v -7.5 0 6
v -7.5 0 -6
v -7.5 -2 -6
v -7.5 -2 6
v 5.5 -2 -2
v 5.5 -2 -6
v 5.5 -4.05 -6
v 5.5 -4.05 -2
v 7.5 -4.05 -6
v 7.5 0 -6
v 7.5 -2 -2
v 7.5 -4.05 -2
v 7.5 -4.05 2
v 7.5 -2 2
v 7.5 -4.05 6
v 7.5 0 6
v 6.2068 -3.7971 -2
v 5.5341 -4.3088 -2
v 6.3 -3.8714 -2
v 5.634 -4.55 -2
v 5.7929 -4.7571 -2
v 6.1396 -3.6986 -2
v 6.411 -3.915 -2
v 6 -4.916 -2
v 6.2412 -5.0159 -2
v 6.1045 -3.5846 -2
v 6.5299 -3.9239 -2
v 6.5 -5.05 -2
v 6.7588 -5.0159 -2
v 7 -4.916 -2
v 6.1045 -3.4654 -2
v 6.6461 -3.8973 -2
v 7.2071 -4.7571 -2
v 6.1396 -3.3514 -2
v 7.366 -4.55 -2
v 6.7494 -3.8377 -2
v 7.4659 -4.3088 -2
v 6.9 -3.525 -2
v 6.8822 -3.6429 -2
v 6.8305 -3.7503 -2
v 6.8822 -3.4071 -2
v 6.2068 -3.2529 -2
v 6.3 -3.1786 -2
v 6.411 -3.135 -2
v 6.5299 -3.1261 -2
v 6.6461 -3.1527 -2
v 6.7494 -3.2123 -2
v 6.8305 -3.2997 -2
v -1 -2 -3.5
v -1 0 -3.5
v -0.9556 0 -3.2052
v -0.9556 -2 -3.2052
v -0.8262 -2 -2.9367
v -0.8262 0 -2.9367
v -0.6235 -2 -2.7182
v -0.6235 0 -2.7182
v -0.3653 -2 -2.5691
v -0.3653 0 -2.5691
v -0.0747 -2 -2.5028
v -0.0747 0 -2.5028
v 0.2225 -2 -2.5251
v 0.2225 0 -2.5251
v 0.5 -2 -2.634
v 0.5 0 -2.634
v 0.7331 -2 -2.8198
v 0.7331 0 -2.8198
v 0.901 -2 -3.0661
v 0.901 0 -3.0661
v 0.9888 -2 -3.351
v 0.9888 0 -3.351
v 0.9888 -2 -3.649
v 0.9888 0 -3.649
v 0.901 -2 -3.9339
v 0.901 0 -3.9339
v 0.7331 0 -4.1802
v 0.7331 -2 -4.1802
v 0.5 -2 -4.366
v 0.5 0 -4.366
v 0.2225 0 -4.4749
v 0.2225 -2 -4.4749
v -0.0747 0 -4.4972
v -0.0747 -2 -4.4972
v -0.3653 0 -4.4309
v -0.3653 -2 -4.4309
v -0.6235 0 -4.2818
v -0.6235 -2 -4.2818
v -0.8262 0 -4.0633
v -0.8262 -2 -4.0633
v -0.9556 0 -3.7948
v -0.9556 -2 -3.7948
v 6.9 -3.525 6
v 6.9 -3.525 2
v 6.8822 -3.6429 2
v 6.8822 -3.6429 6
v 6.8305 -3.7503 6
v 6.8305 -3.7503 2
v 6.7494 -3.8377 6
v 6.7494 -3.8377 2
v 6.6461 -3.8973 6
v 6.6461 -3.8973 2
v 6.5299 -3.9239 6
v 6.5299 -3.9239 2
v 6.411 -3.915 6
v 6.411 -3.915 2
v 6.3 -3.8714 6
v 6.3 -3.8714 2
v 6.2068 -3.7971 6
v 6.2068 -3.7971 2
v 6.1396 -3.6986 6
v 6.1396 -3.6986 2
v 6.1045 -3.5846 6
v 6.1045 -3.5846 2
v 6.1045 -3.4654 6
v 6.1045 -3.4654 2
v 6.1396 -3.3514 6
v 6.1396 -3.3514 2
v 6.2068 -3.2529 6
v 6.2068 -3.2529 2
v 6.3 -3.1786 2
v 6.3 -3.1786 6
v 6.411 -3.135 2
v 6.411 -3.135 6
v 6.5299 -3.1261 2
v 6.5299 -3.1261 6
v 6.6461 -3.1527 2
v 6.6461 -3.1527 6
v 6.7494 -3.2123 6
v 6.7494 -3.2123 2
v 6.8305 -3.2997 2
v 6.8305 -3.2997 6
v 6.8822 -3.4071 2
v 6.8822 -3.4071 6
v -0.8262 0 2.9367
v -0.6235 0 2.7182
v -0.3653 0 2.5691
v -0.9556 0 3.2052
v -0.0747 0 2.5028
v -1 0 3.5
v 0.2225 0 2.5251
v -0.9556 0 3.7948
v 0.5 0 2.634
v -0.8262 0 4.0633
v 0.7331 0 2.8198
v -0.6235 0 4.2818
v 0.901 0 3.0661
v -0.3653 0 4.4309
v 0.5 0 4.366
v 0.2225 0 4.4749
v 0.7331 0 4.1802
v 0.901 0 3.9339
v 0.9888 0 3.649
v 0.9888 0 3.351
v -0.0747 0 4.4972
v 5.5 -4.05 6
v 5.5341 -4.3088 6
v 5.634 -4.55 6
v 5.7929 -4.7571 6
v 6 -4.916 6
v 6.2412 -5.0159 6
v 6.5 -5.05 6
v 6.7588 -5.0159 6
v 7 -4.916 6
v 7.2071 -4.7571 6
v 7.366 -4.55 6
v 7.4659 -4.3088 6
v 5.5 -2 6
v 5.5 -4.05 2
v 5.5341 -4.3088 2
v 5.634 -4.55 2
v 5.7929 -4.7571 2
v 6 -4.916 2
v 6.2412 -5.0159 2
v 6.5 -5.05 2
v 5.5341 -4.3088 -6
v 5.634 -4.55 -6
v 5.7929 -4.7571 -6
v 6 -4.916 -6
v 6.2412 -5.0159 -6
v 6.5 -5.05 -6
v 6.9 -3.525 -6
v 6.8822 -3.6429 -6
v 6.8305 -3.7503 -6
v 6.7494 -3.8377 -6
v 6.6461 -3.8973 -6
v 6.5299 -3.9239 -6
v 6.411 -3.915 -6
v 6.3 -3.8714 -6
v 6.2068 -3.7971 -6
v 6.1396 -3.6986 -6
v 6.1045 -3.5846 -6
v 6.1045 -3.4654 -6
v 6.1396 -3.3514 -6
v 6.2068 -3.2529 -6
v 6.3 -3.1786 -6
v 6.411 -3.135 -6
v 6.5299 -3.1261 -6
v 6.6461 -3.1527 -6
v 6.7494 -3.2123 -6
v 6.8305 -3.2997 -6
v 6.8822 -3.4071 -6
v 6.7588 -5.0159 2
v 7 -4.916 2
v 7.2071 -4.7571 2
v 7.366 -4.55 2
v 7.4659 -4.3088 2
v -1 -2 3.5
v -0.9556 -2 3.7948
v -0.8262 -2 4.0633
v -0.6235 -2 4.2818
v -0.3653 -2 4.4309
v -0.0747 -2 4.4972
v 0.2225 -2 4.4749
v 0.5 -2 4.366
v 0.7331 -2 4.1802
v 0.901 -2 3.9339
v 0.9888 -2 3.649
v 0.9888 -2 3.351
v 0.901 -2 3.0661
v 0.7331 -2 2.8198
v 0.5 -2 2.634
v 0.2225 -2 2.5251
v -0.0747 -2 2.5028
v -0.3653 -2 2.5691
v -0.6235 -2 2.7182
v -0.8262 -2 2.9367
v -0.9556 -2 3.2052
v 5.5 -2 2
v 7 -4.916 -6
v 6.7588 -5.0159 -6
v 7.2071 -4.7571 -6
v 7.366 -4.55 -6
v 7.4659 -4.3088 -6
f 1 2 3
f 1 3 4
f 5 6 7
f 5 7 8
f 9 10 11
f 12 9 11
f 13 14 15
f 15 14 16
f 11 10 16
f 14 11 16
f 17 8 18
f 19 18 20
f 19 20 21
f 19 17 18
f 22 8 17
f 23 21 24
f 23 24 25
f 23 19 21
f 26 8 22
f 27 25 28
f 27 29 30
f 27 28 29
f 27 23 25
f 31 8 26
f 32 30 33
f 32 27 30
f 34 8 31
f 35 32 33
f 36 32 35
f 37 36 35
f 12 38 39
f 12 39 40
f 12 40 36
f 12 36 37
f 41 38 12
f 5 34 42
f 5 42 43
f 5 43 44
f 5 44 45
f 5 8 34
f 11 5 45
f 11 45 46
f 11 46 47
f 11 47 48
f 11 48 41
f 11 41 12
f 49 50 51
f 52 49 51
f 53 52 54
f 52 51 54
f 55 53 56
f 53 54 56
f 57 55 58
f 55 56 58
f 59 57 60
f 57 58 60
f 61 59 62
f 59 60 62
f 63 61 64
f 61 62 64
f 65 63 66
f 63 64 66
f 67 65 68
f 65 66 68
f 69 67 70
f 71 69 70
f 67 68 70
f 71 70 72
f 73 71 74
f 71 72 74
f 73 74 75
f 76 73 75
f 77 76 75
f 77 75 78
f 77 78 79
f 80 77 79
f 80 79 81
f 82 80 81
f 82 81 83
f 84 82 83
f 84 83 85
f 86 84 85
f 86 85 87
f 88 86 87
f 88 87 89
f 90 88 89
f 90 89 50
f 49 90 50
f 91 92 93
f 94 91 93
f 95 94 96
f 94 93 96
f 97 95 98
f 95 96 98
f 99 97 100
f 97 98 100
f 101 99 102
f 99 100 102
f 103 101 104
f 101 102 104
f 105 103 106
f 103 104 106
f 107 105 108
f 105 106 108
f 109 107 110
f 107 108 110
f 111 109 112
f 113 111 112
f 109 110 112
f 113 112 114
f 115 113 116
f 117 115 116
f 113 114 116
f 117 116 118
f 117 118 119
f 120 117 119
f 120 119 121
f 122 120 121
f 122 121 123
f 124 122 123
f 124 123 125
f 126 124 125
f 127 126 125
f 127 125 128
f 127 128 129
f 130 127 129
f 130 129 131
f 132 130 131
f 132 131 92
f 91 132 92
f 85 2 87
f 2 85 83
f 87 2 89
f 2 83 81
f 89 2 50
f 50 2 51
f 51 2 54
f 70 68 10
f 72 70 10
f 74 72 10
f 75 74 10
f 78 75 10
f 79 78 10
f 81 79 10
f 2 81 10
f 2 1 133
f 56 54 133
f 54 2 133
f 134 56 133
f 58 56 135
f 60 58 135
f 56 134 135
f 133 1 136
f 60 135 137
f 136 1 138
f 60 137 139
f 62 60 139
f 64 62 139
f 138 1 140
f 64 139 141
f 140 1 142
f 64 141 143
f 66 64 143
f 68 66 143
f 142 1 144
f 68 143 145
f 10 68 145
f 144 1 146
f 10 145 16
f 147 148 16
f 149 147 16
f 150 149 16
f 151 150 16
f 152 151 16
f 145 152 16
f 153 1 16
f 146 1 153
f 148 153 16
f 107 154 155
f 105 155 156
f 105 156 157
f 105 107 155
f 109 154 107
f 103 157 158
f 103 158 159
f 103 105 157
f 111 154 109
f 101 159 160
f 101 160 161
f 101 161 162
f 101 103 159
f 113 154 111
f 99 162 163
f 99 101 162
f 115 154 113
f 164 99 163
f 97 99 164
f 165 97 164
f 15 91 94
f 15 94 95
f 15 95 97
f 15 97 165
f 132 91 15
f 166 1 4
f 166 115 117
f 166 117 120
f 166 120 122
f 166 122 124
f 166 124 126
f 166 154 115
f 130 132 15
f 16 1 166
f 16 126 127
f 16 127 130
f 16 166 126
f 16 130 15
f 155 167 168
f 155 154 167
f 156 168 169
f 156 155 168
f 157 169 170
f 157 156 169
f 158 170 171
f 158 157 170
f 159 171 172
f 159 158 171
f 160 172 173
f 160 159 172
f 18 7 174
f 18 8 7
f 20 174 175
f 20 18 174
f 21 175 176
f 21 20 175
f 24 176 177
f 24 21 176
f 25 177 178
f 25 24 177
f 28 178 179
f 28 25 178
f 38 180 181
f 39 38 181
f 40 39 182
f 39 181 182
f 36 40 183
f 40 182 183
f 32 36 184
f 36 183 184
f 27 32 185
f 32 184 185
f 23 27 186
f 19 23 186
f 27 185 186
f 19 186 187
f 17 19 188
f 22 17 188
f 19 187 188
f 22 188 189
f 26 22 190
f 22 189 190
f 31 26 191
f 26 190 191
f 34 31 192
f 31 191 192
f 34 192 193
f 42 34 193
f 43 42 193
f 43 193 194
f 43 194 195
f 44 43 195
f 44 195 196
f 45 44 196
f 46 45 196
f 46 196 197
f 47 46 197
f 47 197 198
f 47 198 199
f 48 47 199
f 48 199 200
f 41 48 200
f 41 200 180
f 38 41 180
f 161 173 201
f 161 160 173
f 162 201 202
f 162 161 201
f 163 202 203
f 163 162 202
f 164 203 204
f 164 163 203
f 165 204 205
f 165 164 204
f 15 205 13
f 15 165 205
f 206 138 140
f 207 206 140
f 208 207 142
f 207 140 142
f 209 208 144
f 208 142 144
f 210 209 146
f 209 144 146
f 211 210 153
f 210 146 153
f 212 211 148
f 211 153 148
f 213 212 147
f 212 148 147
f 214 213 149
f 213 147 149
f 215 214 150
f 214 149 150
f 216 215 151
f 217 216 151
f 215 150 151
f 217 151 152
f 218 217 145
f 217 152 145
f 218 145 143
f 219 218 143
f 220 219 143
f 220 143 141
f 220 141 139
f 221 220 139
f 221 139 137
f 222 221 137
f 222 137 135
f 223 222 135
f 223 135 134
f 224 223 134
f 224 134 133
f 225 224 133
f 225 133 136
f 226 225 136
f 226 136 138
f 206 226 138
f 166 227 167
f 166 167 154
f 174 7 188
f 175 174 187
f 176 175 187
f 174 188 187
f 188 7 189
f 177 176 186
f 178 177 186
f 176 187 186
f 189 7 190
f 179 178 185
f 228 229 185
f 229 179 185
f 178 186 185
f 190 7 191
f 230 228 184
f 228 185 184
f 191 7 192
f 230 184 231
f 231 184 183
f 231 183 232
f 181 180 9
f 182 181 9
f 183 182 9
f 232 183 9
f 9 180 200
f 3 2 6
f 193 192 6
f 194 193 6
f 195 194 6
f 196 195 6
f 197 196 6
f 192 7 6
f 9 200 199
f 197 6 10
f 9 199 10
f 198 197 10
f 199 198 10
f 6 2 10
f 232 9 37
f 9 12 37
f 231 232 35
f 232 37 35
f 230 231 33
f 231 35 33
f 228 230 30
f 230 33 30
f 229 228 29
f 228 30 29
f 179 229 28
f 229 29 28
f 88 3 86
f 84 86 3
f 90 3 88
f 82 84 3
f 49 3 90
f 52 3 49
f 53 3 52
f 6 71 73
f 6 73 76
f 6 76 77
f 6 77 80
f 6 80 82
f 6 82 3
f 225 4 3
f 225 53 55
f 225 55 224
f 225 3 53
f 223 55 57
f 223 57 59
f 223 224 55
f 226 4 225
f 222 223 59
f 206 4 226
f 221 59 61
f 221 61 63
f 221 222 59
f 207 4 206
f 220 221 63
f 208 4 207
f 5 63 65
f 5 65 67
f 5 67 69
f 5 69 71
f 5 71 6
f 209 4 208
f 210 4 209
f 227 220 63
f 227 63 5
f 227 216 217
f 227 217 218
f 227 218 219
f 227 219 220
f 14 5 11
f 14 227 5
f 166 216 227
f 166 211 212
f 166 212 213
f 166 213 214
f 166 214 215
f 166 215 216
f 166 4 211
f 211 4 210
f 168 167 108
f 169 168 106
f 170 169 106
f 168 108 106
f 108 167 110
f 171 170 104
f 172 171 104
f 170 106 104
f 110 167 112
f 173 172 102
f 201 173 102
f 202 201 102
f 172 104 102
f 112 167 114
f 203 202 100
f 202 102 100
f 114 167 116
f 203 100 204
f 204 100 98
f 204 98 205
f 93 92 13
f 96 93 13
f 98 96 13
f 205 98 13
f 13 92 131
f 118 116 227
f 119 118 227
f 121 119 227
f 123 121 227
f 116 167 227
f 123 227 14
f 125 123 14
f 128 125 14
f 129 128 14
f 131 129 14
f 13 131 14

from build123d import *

# Parameters (mm, degrees)
F0_W     = 15
F0_H     = 12
F1_DEPTH = 2
F2_W     = 2
F2_H     = 4
F3_DEPTH = 3.05
F4_R     = 0.4
F5_DEPTH = 25
F6_R     = 0.99999
F7_R     = 1
F8_DEPTH = 25


# Not quite as in the source:
# - a fillet or chamfer is up to 0.001 mm smaller than in the source, because OpenCascade refuses the exact size


with BuildPart() as f1:
    # F0 (on Front) → F1 (new body)
    with BuildSketch(Plane.XZ):
        Rectangle(F0_W, F0_H)
    extrude(amount=F1_DEPTH)

    # F2 (on face) → F3 (join)
    with BuildSketch(Plane.XZ.offset(2)):
        with Locations((6.5, 4)):
            Rectangle(F2_W, F2_H)
        with Locations((6.5, -4)):
            Rectangle(F2_W, F2_H)
    extrude(amount=F3_DEPTH)

    # F4 (on face) → F5 (cut)
    with BuildSketch(Plane(origin=(0, 0, -6), x_dir=(1, 0, 0), z_dir=(0, 0, -1))):
        with Locations((6.5, 3.525)):
            Circle(F4_R)
    extrude(amount=-F5_DEPTH, mode=Mode.SUBTRACT)

    # F6 (radius 1 in the source; OpenCascade refuses exactly that, so slightly less here)
    f6_edges = [f1.edges().sort_by_distance(p)[0] for p in [
        (7.5, -5.05, 4),
        (5.5, -5.05, 4),
        (7.5, -5.05, -4),
        (5.5, -5.05, -4),
    ]]
    fillet(f6_edges, radius=F6_R)

    # F7 (on face) → F8 (cut)
    with BuildSketch(Plane(origin=(0, 0, 0), x_dir=(-1, 0, 0), z_dir=(0, 1, 0))):
        with Locations((0, 3.5)):
            Circle(F7_R)
        with Locations((0, -3.5)):
            Circle(F7_R)
    extrude(amount=-F8_DEPTH, mode=Mode.SUBTRACT)


solid = f1.part
